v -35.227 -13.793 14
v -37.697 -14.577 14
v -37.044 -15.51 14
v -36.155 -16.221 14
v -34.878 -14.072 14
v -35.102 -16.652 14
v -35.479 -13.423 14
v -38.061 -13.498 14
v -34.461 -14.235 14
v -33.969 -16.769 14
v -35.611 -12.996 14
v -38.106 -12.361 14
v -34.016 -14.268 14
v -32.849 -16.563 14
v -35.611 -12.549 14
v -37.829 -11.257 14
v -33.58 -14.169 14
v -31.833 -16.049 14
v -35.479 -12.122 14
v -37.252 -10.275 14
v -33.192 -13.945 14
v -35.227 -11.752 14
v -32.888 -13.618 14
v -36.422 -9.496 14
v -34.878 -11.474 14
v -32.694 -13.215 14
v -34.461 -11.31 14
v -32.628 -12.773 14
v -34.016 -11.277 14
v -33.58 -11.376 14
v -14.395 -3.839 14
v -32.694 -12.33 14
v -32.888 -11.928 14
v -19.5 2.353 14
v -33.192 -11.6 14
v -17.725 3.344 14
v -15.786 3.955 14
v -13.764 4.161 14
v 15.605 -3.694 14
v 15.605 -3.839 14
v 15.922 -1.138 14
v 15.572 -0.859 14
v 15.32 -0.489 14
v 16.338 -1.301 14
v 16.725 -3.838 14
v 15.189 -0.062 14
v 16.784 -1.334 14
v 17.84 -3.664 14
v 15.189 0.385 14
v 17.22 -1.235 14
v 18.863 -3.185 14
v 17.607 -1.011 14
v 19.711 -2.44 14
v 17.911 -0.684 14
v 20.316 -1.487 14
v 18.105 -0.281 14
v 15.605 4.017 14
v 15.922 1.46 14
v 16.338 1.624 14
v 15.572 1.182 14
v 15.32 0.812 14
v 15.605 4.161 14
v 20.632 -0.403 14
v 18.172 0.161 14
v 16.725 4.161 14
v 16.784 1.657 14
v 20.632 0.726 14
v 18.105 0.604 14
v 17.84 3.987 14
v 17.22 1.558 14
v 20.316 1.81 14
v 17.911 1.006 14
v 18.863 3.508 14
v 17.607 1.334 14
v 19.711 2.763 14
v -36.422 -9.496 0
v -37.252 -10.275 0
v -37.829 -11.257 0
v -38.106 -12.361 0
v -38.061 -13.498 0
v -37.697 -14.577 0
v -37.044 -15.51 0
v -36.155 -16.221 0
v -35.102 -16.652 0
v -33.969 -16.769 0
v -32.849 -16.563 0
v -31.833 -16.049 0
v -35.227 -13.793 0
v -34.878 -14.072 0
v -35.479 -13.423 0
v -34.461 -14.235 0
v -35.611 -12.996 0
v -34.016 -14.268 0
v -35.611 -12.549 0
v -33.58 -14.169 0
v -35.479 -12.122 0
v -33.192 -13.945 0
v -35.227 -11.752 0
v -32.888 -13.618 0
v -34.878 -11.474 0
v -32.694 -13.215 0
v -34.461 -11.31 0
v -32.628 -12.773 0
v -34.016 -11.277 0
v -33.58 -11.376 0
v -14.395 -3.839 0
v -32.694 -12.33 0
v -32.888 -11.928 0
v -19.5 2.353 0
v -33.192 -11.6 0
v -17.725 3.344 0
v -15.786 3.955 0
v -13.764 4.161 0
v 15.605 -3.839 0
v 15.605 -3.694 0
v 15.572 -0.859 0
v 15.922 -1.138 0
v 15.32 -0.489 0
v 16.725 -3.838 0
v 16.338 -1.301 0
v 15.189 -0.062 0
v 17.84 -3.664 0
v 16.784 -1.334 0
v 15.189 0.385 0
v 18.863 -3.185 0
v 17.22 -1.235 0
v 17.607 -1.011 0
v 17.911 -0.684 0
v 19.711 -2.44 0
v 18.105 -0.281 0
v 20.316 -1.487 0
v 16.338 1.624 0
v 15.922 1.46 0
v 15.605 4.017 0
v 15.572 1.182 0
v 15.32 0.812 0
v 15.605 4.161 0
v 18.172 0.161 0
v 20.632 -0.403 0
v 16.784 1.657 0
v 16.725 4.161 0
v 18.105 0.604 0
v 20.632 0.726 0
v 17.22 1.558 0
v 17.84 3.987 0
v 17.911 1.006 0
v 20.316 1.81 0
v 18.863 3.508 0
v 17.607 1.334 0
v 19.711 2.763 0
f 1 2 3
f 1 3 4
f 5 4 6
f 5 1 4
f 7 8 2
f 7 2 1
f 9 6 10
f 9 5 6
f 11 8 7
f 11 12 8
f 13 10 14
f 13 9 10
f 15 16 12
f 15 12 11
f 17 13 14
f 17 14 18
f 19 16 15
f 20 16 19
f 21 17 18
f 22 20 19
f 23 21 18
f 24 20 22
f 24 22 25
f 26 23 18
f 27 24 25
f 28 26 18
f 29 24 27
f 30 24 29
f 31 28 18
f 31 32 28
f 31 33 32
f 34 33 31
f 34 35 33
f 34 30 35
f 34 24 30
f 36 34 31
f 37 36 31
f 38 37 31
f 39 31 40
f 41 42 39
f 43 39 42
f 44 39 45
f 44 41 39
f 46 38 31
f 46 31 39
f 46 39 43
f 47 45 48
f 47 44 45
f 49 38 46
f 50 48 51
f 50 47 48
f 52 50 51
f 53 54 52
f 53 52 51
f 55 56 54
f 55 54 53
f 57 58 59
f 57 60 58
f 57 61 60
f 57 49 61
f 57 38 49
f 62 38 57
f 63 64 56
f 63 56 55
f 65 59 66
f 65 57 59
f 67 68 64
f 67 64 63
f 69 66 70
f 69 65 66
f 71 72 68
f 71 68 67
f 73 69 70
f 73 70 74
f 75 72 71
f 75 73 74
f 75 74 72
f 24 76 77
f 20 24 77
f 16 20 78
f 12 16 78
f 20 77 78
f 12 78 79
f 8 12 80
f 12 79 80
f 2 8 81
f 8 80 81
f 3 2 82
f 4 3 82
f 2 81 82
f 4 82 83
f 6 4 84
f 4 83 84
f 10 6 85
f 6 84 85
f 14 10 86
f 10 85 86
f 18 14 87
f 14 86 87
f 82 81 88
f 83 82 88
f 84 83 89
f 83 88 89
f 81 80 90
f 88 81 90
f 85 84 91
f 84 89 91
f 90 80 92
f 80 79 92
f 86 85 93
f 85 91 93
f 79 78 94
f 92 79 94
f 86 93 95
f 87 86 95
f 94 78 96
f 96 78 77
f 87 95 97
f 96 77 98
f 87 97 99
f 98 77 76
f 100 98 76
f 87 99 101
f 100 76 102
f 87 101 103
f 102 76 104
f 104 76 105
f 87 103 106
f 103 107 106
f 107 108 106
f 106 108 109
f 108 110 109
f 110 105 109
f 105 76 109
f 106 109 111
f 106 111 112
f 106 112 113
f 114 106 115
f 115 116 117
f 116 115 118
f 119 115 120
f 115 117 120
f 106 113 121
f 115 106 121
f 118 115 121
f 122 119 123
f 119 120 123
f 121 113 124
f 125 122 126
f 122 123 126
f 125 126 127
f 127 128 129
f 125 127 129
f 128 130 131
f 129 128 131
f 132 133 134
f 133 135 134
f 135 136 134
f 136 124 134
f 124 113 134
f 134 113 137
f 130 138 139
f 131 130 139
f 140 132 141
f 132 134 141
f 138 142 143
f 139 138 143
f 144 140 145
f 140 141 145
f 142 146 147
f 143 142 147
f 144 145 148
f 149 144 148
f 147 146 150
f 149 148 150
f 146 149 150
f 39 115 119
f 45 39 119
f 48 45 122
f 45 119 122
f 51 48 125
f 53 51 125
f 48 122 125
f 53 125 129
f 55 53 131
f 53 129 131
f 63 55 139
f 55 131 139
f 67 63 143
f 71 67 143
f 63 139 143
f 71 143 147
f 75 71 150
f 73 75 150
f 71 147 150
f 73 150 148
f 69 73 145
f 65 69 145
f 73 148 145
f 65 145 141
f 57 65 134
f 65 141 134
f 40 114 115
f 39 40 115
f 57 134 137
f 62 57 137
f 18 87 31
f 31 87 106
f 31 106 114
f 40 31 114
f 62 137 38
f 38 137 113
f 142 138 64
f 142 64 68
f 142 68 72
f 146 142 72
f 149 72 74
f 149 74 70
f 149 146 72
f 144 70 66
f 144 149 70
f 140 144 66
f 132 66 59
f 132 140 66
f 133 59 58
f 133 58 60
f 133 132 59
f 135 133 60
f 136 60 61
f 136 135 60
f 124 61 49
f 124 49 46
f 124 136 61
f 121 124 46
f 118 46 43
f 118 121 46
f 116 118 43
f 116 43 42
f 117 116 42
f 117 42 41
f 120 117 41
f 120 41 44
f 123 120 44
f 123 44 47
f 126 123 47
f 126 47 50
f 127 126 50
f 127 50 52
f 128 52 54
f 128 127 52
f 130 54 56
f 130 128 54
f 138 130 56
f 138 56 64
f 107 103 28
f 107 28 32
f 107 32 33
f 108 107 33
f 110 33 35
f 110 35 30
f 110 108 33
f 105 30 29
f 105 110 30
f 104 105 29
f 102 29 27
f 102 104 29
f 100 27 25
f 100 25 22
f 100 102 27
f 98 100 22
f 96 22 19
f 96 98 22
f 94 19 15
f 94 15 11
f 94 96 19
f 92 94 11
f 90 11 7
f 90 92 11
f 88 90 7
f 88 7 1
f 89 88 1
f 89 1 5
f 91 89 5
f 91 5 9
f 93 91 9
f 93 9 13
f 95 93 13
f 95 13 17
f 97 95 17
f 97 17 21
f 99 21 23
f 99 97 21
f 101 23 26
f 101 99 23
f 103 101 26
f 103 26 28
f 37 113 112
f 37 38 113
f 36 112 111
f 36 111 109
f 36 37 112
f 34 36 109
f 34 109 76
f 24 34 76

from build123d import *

# Parameters (mm, degrees)
SKETCH_1_R      = 1.5
EXTRUDE_2_DEPTH = 14
FILLET_1_R      = 10


with BuildPart() as part:
    # 草图1 → 凸台-拉伸2 (new body)
    with BuildSketch(Plane.XY):
        with BuildLine():
            Line((15.60515688, 4.016530447), (15.60515688, 4.161375168))
            Line((15.60515688, 4.161375168), (-16.917233431, 4.161375168))
            Line((-16.917233431, 4.161375168), (-36.422020871, -9.496024029))
            ThreePointArc((-36.422020871, -9.496024029), (-37.404323302, -15.066937951), (-31.83340938, -16.049240383))
            Line((-31.83340938, -16.049240383), (-14.39484312, -3.838624832))
            Line((-14.39484312, -3.838624832), (15.60515688, -3.838624832))
            Line((15.60515688, -3.838624832), (15.60515688, -3.693780111))
            ThreePointArc((15.60515688, -3.693780111), (20.671823547, 0.161375168), (15.60515688, 4.016530447))
        make_face()
        with Locations((-34.127715125, -12.772632206)):
            Circle(SKETCH_1_R, mode=Mode.SUBTRACT)
        with Locations((16.671823547, 0.161375168)):
            Circle(SKETCH_1_R, mode=Mode.SUBTRACT)
    extrude(amount=EXTRUDE_2_DEPTH)

    # 圆角1
    fillet_1_edges = [part.edges().sort_by_distance(p)[0] for p in [
        (-16.917233431, 4.161375168, 7),
    ]]
    fillet(fillet_1_edges, radius=FILLET_1_R)


solid = part.part
